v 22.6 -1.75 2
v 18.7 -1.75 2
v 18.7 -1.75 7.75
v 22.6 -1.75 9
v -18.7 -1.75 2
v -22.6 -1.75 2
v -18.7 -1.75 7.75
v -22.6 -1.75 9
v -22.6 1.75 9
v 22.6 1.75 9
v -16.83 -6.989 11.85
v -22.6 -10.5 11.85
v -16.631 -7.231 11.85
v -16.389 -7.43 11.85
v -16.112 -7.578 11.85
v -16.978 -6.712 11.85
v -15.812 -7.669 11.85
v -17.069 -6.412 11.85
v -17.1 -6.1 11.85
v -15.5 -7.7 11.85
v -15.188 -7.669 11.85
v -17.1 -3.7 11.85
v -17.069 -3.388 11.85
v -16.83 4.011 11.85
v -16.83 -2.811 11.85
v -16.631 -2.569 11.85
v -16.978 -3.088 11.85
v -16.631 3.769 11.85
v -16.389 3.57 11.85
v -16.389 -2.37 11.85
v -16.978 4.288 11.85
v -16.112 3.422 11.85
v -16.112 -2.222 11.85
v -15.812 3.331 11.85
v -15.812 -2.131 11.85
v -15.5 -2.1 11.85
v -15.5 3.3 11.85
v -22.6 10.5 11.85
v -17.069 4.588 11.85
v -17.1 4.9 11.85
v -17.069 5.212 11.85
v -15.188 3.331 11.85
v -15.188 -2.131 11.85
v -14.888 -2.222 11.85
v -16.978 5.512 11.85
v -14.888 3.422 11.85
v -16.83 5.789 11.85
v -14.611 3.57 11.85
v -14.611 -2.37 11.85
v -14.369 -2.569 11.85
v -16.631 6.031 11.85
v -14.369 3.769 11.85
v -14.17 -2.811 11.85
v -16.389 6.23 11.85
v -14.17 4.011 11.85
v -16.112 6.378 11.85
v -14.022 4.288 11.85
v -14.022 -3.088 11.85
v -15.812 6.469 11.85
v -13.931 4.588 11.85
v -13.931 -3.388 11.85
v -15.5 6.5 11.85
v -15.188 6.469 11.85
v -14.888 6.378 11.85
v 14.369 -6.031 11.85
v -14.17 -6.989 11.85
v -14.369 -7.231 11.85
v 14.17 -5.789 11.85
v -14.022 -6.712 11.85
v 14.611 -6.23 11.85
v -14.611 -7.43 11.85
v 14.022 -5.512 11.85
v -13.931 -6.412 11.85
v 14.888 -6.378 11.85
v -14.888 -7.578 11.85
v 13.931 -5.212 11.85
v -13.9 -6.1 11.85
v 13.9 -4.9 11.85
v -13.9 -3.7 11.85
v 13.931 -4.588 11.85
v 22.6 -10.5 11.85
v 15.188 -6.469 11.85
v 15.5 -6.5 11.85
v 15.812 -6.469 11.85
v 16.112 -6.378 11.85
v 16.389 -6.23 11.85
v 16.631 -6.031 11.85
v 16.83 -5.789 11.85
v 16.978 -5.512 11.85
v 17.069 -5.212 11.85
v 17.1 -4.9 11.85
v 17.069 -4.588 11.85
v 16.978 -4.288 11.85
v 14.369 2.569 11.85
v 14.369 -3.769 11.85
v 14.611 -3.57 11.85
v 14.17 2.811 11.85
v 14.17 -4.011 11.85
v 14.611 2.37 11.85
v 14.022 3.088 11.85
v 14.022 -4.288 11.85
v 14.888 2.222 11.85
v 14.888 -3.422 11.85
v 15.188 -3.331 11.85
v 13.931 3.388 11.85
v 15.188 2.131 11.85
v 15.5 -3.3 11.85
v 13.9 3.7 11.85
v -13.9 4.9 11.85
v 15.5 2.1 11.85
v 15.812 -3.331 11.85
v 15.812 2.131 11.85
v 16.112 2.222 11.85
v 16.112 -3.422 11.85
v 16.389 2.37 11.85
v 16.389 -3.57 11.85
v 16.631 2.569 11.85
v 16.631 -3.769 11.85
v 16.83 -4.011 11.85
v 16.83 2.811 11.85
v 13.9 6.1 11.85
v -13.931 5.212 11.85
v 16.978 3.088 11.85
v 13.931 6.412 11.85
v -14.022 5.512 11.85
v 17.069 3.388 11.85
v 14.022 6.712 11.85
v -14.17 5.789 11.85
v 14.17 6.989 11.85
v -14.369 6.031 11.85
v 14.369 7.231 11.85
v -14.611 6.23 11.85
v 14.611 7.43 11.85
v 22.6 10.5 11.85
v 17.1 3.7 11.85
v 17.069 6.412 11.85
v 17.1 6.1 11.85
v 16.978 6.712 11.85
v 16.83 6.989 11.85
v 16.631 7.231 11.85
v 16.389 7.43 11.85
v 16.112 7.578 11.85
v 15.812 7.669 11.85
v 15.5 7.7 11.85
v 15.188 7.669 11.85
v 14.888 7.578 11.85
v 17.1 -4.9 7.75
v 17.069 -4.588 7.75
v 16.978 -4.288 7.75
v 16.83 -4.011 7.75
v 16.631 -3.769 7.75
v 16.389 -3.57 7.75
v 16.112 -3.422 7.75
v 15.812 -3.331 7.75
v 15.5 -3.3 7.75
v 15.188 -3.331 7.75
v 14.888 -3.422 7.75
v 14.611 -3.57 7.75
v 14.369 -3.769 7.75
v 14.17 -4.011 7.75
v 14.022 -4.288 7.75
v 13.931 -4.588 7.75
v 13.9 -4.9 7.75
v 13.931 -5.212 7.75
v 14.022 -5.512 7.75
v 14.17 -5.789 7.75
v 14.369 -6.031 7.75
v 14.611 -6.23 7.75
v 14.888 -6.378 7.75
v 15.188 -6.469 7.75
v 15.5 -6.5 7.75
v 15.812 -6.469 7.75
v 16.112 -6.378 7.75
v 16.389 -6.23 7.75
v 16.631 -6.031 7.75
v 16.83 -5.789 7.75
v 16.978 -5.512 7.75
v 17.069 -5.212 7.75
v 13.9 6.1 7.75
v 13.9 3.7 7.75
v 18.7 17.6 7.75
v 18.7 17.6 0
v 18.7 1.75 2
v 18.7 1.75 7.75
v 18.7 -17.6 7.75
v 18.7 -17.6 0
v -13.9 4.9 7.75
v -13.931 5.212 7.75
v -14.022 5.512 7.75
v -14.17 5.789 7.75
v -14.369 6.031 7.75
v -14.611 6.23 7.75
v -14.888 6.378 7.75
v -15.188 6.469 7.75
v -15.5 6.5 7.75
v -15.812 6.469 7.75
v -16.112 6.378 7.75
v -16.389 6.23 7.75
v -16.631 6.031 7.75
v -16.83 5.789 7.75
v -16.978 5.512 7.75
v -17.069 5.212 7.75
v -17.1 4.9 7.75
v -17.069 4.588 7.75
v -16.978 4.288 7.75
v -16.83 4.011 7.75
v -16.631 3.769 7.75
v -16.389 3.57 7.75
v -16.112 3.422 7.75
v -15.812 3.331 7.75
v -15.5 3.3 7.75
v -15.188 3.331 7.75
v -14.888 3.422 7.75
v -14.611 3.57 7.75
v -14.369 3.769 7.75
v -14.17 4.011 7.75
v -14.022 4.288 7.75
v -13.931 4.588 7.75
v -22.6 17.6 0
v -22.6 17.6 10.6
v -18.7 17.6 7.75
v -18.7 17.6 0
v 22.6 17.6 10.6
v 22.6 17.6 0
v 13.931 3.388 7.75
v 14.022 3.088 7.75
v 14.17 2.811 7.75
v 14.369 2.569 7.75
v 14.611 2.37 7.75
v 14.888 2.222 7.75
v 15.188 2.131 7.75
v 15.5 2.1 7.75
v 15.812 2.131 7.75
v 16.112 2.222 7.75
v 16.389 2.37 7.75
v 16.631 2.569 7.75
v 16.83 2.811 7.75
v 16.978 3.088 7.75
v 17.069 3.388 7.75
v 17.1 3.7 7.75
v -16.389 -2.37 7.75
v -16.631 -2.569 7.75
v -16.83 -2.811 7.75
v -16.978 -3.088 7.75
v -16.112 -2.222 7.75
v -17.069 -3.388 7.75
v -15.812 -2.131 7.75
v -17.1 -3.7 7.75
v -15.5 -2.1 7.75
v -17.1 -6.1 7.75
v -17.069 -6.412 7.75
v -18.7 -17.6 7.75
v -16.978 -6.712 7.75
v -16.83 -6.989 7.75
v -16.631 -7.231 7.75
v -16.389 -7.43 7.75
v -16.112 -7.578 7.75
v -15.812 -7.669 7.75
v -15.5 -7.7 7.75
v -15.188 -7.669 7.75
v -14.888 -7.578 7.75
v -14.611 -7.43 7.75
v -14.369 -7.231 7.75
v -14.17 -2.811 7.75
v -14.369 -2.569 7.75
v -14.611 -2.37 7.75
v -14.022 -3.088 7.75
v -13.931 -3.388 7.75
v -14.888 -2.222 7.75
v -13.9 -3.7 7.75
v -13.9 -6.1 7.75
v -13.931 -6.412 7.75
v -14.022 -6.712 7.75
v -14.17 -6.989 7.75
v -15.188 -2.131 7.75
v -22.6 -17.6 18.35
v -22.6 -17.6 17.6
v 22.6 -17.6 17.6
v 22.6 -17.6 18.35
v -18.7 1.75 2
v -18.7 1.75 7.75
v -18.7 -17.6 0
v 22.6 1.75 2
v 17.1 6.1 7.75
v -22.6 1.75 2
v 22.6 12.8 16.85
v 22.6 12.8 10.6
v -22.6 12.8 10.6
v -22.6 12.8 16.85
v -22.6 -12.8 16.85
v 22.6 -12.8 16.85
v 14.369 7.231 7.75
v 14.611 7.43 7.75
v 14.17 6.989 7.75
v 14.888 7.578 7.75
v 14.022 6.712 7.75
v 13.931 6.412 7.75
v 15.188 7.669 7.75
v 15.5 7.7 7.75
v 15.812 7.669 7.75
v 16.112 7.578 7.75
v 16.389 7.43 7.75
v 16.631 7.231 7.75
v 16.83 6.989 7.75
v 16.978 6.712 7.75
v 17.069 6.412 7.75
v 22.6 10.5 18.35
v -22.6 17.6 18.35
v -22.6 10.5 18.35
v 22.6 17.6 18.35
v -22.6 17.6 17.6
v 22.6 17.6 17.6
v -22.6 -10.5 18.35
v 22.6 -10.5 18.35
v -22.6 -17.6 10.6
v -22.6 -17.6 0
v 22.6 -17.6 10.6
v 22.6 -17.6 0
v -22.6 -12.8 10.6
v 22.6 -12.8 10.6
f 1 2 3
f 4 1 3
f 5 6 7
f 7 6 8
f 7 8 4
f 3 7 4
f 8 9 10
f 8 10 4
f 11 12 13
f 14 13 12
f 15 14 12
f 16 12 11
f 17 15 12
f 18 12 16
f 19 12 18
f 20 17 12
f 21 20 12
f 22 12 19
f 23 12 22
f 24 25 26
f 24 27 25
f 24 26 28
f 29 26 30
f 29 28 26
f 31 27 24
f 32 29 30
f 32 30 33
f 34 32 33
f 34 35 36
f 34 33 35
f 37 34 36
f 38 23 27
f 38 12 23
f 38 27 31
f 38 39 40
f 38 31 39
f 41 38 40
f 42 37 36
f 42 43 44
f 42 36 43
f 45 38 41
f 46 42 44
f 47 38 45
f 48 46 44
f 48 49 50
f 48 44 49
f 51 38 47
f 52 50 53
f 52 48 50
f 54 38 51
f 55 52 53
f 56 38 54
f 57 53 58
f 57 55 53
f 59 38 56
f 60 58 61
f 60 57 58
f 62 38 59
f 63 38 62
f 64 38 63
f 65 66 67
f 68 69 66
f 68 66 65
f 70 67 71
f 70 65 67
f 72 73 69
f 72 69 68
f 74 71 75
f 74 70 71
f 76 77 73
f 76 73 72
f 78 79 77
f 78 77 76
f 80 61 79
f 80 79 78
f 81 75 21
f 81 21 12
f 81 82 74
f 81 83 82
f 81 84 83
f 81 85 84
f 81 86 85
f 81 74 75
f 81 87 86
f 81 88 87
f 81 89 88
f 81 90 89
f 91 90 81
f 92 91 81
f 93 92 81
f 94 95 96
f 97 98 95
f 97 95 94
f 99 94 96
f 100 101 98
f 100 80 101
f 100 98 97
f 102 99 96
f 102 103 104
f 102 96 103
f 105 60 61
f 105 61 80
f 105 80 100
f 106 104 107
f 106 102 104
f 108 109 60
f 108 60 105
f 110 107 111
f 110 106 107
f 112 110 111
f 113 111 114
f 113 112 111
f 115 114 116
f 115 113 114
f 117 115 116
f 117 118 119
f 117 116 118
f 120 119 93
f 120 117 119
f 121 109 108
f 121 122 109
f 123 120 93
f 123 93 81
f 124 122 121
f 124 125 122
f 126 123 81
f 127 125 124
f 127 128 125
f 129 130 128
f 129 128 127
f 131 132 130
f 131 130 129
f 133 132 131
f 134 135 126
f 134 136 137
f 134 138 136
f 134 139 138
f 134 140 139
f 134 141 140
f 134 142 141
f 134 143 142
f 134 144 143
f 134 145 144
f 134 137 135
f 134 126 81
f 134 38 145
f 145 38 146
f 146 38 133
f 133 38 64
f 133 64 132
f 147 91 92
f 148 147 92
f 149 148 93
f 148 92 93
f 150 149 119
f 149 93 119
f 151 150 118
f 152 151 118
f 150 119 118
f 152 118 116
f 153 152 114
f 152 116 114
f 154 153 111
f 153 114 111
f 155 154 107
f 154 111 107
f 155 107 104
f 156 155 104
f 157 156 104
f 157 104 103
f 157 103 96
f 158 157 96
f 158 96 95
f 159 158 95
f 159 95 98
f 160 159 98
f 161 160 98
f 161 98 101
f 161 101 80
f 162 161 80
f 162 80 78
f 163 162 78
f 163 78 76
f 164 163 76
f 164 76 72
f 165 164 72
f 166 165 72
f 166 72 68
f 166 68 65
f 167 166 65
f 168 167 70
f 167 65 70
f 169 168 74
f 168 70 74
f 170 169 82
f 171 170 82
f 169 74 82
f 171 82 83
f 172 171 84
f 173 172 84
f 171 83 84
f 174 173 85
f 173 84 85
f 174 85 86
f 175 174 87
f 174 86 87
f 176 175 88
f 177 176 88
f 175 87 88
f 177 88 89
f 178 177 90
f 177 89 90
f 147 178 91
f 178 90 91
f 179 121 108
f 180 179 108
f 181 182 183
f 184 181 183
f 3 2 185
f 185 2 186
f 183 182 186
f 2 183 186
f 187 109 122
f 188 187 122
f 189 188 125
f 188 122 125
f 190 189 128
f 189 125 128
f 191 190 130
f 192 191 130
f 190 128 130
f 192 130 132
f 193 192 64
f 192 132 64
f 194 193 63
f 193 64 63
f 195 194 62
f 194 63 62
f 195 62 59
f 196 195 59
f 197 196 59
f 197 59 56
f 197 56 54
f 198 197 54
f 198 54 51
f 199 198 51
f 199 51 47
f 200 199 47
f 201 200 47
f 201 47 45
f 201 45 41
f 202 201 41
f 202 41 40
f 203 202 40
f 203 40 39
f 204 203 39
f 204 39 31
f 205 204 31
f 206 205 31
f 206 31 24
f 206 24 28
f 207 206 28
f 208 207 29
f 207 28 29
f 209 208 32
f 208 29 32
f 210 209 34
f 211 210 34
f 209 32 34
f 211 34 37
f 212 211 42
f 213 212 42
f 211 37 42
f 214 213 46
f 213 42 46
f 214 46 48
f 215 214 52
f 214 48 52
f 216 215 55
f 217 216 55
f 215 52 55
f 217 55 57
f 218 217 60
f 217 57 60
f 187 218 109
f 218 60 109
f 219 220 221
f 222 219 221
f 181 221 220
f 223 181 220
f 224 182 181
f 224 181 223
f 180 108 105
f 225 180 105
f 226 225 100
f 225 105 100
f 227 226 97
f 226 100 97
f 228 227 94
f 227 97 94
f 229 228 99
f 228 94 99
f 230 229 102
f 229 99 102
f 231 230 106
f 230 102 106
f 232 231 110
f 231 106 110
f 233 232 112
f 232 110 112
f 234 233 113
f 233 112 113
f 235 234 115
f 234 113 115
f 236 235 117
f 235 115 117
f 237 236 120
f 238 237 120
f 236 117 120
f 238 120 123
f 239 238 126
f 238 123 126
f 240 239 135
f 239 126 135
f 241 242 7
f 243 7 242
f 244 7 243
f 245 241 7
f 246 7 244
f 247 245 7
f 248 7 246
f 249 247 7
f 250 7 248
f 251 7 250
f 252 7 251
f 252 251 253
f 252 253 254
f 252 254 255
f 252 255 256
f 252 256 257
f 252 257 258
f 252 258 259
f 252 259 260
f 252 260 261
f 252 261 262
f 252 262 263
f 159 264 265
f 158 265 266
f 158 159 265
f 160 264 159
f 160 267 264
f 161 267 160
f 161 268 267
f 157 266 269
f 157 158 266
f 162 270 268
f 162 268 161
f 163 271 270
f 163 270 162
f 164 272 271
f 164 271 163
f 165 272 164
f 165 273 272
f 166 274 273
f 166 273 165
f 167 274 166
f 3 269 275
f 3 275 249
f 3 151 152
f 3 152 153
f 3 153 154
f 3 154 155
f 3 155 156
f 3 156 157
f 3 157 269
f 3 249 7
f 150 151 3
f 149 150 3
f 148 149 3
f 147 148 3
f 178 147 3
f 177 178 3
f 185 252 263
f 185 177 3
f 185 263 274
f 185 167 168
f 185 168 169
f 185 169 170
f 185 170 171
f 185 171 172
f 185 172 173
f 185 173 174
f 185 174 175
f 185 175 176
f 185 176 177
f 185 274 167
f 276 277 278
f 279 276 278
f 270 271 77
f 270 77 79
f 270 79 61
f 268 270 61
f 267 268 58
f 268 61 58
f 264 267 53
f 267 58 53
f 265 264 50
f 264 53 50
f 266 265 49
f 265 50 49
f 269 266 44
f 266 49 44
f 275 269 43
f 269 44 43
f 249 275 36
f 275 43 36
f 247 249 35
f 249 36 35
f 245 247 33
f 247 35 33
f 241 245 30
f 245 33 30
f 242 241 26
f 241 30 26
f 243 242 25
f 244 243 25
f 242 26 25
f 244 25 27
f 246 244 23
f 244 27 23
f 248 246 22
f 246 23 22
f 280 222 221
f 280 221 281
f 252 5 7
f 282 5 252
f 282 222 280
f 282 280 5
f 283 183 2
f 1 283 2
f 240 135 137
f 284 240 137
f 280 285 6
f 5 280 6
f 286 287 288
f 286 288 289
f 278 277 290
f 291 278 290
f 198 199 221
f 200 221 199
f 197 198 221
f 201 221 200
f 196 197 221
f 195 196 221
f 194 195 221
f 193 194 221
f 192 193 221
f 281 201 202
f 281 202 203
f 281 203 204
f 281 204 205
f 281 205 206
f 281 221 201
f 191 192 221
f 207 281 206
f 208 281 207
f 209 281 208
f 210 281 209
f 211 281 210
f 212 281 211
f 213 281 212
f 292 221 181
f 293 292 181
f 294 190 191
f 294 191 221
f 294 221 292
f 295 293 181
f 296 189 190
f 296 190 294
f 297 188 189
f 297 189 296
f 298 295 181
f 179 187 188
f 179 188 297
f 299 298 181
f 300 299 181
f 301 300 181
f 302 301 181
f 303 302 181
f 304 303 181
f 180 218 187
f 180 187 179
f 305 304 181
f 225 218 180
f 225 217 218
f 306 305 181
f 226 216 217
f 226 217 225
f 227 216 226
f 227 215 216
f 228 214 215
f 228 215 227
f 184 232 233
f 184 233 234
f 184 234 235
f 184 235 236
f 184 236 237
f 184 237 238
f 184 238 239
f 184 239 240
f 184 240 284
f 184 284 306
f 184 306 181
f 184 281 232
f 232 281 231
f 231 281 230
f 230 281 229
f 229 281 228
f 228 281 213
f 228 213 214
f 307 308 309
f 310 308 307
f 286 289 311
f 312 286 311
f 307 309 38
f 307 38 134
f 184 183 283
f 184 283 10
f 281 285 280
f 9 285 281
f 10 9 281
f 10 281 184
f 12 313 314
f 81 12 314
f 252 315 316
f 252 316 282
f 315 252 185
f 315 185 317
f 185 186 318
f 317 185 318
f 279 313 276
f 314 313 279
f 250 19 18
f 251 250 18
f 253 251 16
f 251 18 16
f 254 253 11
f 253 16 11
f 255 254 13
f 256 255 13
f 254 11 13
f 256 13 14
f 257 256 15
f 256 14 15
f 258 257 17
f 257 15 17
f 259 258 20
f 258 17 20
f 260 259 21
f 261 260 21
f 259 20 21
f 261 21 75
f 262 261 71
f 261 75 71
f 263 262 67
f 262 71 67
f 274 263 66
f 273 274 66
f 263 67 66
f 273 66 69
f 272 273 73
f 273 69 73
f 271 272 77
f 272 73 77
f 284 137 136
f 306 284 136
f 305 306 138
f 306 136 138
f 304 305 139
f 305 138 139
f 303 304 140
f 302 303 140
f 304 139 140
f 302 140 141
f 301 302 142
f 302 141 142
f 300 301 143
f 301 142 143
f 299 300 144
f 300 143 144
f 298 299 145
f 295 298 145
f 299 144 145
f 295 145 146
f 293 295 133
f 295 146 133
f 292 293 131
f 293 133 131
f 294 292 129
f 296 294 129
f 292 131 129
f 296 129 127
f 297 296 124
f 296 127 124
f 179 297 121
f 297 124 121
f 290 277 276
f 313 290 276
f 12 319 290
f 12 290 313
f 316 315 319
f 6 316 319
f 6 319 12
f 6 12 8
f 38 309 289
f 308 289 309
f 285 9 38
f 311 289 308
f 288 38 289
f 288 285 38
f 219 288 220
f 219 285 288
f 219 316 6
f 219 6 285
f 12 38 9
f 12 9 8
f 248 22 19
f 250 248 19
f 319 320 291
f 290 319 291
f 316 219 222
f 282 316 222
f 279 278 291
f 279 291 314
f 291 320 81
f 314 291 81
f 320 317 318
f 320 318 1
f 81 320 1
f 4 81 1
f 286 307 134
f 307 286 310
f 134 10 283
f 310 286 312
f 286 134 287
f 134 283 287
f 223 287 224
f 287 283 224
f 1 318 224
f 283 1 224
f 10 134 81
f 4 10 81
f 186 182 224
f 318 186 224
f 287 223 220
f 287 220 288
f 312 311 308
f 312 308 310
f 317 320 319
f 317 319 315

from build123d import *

# Parameters (mm, degrees)
F0_W      = 45.2
F0_H      = 35.2
F1_DEPTH  = 18.35
F2_W      = 37.4
F2_H      = 35.2
F3_DEPTH  = 7.75
F4_W      = 45.2
F4_H      = 21
F5_DEPTH  = 6.5
F6_W      = 4.8
F6_H      = 6.25
F7_DEPTH  = 45.201
F8_W      = 3.5
F8_H      = 7
F9_DEPTH  = 45.201
F10_R     = 1.6
F11_DEPTH = 11.851


with BuildPart() as f1:
    # F0 (on Top) → F1 (new body)
    with BuildSketch(Plane.XY):
        Rectangle(F0_W, F0_H)
    extrude(amount=F1_DEPTH)

    # F2 (on face) → F3 (cut)
    with BuildSketch(Plane(origin=(0, 0, 0), x_dir=(1, 0, 0), z_dir=(0, 0, -1))):
        Rectangle(F2_W, F2_H)
    extrude(amount=-F3_DEPTH, mode=Mode.SUBTRACT)

    # F4 (on face) → F5 (cut)
    with BuildSketch(Plane.XY.offset(18.35)):
        Rectangle(F4_W, F4_H)
    extrude(amount=-F5_DEPTH, mode=Mode.SUBTRACT)

    # F6 (on face) → F7 (cut, through all)
    with BuildSketch(Plane(origin=(-22.6, 0, 0), x_dir=(0, -1, 0), z_dir=(-1, 0, 0))):
        with Locations((-15.2, 13.725)):
            Rectangle(F6_W, F6_H)
        with Locations((15.2, 13.725)):
            Rectangle(F6_W, F6_H)
    extrude(amount=-F7_DEPTH, mode=Mode.SUBTRACT)

    # F8 (on face) → F9 (cut, through all)
    with BuildSketch(Plane(origin=(-22.6, 0, 0), x_dir=(0, -1, 0), z_dir=(-1, 0, 0))):
        Polygon((-12.8, 16.85), (-17.6, 17.6), (-17.6, 16.85), align=None)
        Polygon((17.6, 16.85), (17.6, 17.6), (12.8, 16.85), align=None)
        with Locations((0, 5.5)):
            Rectangle(F8_W, F8_H)
    extrude(amount=-F9_DEPTH, mode=Mode.SUBTRACT)

    # F10 (on face) → F11 (cut, through all)
    with BuildSketch(Plane.XY.offset(11.85)):
        with Locations((15.5, -4.9)):
            Circle(F10_R)
        with Locations((-15.5, 4.9)):
            Circle(F10_R)
        with BuildLine():
            ThreePointArc((-16.5583005244, -4.9), (-16.9583005244, -5.4416994756), (-17.1, -6.1))
            ThreePointArc((-17.1, -6.1), (-15.5, -7.7), (-13.9, -6.1))
            ThreePointArc((-13.9, -6.1), (-14.0416994756, -5.4416994756), (-14.4416994756, -4.9))
            ThreePointArc((-14.4416994756, -4.9), (-15.5, -5.3), (-16.5583005244, -4.9))
        make_face()
        with BuildLine():
            Line((-17.1, -3.7), (-17.1, -6.1))
            ThreePointArc((-17.1, -6.1), (-16.9583005244, -5.4416994756), (-16.5583005244, -4.9))
            ThreePointArc((-16.5583005244, -4.9), (-16.9583005244, -4.3583005244), (-17.1, -3.7))
        make_face()
        with BuildLine():
            ThreePointArc((-14.4416994756, -4.9), (-14.0416994756, -5.4416994756), (-13.9, -6.1))
            Line((-13.9, -6.1), (-13.9, -3.7))
            ThreePointArc((-13.9, -3.7), (-14.0416994756, -4.3583005244), (-14.4416994756, -4.9))
        make_face()
        with BuildLine():
            ThreePointArc((-17.1, -3.7), (-16.9583005244, -4.3583005244), (-16.5583005244, -4.9))
            ThreePointArc((-16.5583005244, -4.9), (-15.5, -4.5), (-14.4416994756, -4.9))
            ThreePointArc((-14.4416994756, -4.9), (-14.0416994756, -4.3583005244), (-13.9, -3.7))
            ThreePointArc((-13.9, -3.7), (-15.5, -2.1), (-17.1, -3.7))
        make_face()
        with BuildLine():
            ThreePointArc((14.4416994756, 4.9), (14.0416994756, 4.3583005244), (13.9, 3.7))
            ThreePointArc((13.9, 3.7), (15.5, 2.1), (17.1, 3.7))
            ThreePointArc((17.1, 3.7), (16.9583005244, 4.3583005244), (16.5583005244, 4.9))
            ThreePointArc((16.5583005244, 4.9), (15.5, 4.5), (14.4416994756, 4.9))
        make_face()
        with BuildLine():
            Line((13.9, 6.1), (13.9, 3.7))
            ThreePointArc((13.9, 3.7), (14.0416994756, 4.3583005244), (14.4416994756, 4.9))
            ThreePointArc((14.4416994756, 4.9), (14.0416994756, 5.4416994756), (13.9, 6.1))
        make_face()
        with BuildLine():
            ThreePointArc((16.5583005244, 4.9), (16.9583005244, 4.3583005244), (17.1, 3.7))
            Line((17.1, 3.7), (17.1, 6.1))
            ThreePointArc((17.1, 6.1), (16.9583005244, 5.4416994756), (16.5583005244, 4.9))
        make_face()
        with BuildLine():
            ThreePointArc((13.9, 6.1), (14.0416994756, 5.4416994756), (14.4416994756, 4.9))
            ThreePointArc((14.4416994756, 4.9), (15.5, 5.3), (16.5583005244, 4.9))
            ThreePointArc((16.5583005244, 4.9), (16.9583005244, 5.4416994756), (17.1, 6.1))
            ThreePointArc((17.1, 6.1), (15.5, 7.7), (13.9, 6.1))
        make_face()
        with BuildLine():
            ThreePointArc((16.5583005244, 4.9), (15.5, 5.3), (14.4416994756, 4.9))
            ThreePointArc((14.4416994756, 4.9), (15.5, 4.5), (16.5583005244, 4.9))
        make_face()
        with BuildLine():
            ThreePointArc((-14.4416994756, -4.9), (-15.5, -4.5), (-16.5583005244, -4.9))
            ThreePointArc((-16.5583005244, -4.9), (-15.5, -5.3), (-14.4416994756, -4.9))
        make_face()
    extrude(amount=-F11_DEPTH, mode=Mode.SUBTRACT)


solid = f1.part
